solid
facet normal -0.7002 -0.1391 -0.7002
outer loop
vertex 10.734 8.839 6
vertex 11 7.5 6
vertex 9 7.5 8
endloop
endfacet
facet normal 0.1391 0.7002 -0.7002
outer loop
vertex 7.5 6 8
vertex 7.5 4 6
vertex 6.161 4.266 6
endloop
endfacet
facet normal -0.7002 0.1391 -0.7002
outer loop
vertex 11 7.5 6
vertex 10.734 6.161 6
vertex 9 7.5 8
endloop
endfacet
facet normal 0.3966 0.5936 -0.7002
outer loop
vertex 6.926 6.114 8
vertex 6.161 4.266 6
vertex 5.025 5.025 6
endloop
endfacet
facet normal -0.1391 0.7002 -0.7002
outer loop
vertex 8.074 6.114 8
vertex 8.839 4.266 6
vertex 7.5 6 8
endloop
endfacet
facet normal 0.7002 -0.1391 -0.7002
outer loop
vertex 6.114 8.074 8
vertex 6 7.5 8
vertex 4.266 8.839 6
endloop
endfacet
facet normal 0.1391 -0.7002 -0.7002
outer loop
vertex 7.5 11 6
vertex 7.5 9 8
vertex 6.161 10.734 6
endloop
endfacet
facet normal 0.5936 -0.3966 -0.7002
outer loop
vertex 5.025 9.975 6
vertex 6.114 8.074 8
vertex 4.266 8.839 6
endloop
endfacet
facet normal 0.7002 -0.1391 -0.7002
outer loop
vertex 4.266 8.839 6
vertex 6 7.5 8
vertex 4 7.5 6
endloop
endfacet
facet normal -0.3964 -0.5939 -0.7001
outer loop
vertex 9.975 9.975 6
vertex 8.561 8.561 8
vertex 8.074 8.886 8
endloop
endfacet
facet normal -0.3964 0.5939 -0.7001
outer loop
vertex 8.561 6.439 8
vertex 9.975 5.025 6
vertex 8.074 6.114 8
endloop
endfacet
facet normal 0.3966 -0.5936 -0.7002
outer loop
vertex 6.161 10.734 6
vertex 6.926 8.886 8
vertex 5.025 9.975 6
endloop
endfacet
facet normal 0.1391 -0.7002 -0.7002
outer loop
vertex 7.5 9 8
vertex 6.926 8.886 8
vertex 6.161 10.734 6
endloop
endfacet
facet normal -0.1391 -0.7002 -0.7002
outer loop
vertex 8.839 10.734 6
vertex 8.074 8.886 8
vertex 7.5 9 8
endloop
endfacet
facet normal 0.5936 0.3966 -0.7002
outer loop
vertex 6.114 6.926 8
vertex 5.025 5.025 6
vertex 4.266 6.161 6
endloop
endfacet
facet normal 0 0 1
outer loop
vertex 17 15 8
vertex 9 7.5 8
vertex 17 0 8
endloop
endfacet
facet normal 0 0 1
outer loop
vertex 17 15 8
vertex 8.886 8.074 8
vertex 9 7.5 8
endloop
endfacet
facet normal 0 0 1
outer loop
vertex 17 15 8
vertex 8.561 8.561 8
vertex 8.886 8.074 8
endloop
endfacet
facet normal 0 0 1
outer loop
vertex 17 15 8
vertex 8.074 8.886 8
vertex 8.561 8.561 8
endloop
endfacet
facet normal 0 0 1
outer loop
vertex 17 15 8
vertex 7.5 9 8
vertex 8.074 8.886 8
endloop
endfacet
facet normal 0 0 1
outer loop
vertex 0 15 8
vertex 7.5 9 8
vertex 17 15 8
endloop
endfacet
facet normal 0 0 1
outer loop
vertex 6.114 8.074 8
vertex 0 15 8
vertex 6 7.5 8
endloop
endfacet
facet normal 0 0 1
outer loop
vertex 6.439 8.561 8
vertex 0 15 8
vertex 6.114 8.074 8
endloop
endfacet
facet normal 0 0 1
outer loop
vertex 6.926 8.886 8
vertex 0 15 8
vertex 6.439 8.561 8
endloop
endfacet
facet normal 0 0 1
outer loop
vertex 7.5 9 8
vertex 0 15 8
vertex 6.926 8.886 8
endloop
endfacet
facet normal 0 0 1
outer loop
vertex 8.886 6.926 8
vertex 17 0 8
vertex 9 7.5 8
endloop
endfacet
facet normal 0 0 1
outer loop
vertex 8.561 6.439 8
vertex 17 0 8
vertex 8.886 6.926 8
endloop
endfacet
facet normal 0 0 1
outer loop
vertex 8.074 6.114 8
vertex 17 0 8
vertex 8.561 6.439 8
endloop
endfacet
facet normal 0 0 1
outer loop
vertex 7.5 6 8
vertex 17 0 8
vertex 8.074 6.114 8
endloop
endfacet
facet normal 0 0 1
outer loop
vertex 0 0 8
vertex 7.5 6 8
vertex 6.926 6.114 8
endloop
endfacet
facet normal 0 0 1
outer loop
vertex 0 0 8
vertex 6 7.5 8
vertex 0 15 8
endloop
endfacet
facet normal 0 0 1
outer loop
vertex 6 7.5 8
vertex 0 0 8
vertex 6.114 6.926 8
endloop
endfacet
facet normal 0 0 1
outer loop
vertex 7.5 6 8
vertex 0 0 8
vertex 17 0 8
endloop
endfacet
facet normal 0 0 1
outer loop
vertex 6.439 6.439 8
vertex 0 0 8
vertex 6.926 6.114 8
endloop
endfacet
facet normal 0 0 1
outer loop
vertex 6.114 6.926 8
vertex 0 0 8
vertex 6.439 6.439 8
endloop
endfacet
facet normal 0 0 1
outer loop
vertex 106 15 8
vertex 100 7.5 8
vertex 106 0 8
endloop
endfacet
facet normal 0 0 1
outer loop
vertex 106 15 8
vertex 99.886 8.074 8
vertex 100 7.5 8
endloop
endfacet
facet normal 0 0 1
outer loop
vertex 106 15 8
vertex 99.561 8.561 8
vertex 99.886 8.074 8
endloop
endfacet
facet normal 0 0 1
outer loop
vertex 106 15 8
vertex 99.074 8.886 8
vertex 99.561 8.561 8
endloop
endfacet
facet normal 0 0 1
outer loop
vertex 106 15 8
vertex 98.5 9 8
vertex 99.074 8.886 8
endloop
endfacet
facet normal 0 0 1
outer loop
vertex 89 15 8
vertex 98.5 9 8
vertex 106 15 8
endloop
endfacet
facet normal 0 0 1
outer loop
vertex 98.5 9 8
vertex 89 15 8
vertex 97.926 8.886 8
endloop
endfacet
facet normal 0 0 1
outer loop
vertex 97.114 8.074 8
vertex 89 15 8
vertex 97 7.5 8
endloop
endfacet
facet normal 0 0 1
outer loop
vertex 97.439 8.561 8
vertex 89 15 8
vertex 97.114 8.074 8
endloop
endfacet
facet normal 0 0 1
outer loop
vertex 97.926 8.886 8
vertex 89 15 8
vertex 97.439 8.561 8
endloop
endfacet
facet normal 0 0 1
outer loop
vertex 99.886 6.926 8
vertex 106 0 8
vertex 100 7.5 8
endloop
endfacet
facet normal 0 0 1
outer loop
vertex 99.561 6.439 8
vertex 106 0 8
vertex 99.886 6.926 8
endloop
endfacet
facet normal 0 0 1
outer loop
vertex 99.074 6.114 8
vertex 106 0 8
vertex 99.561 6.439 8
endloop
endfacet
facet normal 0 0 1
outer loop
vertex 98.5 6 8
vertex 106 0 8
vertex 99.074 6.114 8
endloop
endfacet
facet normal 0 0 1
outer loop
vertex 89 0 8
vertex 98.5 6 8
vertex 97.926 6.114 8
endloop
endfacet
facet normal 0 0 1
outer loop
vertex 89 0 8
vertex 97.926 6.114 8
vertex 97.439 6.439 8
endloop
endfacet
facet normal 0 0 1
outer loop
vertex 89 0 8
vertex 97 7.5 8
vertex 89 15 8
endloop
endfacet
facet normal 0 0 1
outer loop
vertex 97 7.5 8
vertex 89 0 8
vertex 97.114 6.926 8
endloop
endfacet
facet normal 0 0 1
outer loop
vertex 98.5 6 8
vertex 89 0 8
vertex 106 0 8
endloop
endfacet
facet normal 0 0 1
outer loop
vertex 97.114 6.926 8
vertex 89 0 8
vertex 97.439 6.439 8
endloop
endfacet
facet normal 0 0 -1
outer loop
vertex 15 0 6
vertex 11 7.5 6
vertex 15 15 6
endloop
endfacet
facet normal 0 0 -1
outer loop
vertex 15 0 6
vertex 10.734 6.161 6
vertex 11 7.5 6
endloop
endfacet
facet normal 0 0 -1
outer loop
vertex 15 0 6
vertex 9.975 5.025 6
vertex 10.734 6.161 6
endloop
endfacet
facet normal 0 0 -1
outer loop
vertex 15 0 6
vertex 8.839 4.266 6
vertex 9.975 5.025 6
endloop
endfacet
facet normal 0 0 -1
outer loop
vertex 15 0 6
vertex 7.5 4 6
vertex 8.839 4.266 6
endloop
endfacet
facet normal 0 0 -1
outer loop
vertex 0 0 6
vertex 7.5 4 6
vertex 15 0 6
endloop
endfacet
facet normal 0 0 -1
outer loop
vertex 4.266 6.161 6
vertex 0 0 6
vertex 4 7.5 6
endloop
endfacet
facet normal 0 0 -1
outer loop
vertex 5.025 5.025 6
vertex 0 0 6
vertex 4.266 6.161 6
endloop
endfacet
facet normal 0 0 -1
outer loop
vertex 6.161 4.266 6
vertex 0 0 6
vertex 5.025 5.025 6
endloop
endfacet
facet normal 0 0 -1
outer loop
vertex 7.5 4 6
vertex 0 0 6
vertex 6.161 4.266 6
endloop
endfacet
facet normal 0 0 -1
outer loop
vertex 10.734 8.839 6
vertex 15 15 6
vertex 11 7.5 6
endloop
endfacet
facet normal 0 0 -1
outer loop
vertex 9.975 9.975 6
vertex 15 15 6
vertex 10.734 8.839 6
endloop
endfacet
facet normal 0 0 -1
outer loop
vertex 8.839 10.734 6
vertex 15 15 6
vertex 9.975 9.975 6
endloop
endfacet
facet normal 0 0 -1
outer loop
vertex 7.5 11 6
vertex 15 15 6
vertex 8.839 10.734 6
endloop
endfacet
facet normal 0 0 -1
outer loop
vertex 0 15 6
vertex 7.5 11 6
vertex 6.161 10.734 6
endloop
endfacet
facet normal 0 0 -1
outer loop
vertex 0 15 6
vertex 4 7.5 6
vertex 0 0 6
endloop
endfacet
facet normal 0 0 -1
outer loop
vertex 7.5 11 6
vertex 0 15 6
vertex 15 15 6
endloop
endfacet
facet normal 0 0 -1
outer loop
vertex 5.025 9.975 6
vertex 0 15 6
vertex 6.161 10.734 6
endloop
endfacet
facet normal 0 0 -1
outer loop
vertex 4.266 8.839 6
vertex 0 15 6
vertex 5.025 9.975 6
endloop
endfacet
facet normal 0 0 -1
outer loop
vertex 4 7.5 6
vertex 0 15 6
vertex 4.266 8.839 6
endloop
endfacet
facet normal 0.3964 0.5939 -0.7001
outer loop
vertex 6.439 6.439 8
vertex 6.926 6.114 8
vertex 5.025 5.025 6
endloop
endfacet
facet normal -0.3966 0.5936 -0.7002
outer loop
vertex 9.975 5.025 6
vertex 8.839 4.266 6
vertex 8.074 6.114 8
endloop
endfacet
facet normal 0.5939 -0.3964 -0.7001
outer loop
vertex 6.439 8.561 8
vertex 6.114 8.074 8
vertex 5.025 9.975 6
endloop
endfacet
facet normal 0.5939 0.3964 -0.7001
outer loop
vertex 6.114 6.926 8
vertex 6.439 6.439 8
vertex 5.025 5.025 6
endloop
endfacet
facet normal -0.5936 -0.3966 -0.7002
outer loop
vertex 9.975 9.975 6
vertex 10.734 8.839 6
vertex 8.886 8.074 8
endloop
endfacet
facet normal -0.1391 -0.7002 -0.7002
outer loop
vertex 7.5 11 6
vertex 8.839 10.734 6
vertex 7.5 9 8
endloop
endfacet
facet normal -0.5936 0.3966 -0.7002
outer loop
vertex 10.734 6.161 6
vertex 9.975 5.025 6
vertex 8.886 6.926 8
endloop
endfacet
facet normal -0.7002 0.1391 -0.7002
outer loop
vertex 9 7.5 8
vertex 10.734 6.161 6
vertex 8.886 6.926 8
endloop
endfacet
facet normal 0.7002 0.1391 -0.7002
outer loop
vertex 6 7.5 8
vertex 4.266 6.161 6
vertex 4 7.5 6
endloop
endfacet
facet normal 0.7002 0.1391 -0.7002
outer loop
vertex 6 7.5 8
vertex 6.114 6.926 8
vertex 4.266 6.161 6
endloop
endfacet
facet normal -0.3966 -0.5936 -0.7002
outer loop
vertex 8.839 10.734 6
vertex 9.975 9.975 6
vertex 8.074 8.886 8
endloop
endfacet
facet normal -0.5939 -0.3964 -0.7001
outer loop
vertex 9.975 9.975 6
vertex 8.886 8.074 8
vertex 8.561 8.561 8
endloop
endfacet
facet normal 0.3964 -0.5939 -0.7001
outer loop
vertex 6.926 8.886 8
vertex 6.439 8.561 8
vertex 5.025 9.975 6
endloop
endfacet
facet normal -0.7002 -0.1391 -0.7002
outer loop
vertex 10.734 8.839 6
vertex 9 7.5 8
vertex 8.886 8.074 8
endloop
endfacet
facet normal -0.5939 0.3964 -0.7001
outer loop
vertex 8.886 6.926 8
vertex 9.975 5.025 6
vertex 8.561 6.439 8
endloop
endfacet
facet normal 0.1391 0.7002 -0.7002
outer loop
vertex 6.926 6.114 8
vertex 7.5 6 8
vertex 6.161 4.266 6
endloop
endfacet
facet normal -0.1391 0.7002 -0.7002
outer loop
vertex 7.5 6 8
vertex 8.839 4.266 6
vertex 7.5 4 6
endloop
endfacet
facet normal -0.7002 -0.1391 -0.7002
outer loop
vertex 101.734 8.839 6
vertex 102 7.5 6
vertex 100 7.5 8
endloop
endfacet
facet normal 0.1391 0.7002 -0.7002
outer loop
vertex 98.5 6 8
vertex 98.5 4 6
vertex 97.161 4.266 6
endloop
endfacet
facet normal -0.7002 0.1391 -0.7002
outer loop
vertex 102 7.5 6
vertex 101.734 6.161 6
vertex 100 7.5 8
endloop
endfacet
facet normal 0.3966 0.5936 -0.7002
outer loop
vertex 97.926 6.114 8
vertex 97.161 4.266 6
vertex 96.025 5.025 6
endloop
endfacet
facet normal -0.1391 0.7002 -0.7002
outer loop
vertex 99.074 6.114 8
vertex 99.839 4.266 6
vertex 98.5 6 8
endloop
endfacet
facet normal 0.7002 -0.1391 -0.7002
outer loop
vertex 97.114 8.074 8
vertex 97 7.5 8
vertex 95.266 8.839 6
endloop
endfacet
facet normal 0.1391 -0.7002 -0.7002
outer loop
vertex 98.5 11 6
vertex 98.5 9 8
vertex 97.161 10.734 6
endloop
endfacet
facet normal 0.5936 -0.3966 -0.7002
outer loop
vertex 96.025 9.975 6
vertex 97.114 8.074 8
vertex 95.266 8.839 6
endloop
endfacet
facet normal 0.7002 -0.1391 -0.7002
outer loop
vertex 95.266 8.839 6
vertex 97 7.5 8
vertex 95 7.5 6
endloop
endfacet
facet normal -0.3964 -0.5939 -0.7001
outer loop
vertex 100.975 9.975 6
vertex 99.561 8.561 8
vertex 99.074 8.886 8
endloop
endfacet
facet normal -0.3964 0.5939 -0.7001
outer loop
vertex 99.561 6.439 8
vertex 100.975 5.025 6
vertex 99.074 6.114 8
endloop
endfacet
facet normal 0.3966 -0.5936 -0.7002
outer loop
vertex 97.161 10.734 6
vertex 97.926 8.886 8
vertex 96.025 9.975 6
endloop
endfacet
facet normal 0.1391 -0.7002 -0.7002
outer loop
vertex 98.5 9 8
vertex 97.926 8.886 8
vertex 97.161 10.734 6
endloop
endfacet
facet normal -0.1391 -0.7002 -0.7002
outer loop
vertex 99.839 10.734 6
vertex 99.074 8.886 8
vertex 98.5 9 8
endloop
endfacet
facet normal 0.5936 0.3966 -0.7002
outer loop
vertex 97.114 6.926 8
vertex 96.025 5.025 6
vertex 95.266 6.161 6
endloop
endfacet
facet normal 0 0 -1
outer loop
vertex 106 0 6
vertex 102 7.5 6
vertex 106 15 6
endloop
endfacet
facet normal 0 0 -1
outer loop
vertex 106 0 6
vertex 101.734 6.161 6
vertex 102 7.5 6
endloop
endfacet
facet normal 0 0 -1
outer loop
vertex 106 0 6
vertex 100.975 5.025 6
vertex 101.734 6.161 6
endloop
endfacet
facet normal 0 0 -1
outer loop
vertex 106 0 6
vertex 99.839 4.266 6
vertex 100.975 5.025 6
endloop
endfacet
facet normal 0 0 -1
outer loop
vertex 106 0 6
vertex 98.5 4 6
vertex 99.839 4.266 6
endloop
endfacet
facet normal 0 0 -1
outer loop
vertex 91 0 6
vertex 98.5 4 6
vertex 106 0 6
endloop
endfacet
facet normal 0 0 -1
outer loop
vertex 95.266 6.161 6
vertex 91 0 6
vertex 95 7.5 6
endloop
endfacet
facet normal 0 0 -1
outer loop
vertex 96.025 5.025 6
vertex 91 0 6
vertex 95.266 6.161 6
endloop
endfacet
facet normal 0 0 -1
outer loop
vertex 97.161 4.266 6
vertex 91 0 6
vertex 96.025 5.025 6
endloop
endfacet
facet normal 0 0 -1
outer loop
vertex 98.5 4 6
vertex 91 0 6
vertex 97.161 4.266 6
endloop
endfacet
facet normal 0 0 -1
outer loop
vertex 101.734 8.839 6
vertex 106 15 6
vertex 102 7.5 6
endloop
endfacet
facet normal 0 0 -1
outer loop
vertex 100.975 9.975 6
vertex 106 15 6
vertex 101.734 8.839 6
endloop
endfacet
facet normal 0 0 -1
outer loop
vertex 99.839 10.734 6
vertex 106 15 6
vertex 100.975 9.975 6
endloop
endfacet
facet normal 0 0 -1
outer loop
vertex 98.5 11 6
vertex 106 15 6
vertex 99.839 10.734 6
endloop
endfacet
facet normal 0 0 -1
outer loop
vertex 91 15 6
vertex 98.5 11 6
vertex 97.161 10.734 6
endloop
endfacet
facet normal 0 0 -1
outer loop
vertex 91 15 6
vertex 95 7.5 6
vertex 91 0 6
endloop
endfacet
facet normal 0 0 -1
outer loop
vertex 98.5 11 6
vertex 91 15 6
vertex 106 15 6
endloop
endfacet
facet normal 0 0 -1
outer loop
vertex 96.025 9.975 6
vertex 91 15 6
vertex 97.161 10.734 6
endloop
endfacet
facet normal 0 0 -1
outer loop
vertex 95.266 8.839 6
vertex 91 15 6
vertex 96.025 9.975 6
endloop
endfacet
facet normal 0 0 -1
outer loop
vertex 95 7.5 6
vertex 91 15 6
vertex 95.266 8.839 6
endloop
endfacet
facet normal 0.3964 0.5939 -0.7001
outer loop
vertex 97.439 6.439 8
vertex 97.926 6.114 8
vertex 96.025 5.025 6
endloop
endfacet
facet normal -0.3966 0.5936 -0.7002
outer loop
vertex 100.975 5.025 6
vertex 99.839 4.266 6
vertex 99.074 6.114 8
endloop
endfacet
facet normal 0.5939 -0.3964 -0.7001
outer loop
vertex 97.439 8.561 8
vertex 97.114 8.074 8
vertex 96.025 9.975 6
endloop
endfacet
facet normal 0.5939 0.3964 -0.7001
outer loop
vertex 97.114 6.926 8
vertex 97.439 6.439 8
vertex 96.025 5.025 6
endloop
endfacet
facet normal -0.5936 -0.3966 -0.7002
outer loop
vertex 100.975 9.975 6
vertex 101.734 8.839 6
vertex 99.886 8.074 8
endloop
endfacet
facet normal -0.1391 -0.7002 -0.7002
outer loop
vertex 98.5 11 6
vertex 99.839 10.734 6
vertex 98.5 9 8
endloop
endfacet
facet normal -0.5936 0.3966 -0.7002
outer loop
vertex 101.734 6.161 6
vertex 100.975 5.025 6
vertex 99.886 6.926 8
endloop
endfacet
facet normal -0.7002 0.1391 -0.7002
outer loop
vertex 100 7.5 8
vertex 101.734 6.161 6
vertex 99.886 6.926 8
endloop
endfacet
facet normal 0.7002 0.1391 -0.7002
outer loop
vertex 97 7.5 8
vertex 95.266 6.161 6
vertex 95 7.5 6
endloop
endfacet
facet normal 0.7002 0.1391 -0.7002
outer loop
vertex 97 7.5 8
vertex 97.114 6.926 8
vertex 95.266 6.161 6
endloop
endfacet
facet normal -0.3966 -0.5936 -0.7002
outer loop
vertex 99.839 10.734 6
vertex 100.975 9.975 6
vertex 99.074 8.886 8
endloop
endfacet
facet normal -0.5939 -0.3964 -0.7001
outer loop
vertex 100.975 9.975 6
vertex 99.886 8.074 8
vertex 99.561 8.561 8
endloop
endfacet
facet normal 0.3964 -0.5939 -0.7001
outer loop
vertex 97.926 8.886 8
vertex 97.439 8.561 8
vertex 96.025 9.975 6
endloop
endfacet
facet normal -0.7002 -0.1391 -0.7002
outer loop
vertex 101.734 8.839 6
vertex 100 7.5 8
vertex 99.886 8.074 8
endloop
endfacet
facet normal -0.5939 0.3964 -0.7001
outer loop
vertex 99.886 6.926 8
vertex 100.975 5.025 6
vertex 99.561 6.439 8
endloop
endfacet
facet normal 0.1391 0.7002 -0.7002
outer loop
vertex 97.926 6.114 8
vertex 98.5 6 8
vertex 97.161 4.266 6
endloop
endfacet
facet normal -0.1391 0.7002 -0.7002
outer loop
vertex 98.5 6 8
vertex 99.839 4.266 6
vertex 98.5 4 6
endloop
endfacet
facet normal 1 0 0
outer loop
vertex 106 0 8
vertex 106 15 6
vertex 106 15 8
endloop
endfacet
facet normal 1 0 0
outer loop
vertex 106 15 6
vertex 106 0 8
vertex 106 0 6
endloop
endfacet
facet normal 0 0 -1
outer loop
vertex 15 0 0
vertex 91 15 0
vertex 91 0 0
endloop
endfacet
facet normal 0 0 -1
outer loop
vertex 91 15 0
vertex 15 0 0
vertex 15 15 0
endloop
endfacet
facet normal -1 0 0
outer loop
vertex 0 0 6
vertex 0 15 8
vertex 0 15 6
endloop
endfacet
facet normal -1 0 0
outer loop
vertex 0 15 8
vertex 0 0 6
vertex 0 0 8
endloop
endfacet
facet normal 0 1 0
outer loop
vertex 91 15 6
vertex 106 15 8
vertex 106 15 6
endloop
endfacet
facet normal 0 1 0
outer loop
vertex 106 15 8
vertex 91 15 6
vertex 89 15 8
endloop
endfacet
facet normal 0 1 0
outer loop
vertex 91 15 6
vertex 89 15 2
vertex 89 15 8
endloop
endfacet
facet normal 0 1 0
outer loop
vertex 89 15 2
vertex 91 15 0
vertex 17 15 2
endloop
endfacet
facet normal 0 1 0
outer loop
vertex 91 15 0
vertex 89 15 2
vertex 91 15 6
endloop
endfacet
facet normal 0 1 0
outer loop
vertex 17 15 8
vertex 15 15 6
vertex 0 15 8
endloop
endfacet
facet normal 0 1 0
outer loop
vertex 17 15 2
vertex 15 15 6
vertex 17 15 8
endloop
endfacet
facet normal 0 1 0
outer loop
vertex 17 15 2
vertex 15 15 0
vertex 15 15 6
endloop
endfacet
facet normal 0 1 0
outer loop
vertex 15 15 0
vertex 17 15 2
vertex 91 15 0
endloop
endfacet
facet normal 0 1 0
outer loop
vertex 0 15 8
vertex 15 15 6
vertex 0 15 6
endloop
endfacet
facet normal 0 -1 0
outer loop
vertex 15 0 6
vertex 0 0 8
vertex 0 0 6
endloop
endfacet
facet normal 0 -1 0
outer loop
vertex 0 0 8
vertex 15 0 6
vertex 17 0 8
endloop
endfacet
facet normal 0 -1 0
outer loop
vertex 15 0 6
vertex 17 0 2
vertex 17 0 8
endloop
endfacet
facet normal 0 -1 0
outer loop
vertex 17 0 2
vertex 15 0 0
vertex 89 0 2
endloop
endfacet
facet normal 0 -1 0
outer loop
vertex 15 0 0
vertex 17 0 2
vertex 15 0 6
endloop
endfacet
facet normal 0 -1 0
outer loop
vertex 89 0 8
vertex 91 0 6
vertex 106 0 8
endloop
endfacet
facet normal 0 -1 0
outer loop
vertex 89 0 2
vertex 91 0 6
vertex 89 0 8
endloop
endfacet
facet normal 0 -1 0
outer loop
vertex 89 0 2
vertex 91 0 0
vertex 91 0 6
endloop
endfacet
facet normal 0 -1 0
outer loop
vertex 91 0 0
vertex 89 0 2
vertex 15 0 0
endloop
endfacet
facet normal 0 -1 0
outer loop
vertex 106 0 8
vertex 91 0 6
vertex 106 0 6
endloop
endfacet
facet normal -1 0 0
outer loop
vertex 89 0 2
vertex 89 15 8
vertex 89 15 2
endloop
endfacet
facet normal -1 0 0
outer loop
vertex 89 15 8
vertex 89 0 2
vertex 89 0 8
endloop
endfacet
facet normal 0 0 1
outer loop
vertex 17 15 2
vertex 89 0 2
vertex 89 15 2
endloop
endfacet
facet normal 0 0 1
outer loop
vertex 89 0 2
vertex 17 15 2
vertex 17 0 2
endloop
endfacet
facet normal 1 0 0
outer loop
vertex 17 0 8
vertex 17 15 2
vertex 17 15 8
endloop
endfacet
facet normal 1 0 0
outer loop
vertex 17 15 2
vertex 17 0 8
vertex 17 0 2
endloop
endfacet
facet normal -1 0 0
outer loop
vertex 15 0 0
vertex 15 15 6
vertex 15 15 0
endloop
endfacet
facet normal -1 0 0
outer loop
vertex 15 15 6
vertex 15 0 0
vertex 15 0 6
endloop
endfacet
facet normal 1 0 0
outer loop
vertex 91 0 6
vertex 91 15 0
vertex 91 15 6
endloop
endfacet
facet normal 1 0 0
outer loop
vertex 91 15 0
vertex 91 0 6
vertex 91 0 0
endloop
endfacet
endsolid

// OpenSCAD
Win = 72;
Din = 15;
Hin = 6;
thick = 2;
Wwing = 15;

difference() {
    cube([Win + (Wwing + thick) * 2, Din, Hin + thick]);
    translate([Wwing + thick, 0, thick])
        cube([Win, Din, Hin]);
    cube([Wwing, Din, Hin]);
    translate([Wwing + Win + thick * 2, 0, 0])
        cube([Wwing, Din, Hin]);
    for (x = [Wwing / 2, Win + (Wwing + thick) * 2 - Wwing / 2]) {
        translate([x, Din / 2, Hin])
            cylinder(r1 = 3.5, r2 = 1.5, h = thick, $fn = 16);
    }
}
